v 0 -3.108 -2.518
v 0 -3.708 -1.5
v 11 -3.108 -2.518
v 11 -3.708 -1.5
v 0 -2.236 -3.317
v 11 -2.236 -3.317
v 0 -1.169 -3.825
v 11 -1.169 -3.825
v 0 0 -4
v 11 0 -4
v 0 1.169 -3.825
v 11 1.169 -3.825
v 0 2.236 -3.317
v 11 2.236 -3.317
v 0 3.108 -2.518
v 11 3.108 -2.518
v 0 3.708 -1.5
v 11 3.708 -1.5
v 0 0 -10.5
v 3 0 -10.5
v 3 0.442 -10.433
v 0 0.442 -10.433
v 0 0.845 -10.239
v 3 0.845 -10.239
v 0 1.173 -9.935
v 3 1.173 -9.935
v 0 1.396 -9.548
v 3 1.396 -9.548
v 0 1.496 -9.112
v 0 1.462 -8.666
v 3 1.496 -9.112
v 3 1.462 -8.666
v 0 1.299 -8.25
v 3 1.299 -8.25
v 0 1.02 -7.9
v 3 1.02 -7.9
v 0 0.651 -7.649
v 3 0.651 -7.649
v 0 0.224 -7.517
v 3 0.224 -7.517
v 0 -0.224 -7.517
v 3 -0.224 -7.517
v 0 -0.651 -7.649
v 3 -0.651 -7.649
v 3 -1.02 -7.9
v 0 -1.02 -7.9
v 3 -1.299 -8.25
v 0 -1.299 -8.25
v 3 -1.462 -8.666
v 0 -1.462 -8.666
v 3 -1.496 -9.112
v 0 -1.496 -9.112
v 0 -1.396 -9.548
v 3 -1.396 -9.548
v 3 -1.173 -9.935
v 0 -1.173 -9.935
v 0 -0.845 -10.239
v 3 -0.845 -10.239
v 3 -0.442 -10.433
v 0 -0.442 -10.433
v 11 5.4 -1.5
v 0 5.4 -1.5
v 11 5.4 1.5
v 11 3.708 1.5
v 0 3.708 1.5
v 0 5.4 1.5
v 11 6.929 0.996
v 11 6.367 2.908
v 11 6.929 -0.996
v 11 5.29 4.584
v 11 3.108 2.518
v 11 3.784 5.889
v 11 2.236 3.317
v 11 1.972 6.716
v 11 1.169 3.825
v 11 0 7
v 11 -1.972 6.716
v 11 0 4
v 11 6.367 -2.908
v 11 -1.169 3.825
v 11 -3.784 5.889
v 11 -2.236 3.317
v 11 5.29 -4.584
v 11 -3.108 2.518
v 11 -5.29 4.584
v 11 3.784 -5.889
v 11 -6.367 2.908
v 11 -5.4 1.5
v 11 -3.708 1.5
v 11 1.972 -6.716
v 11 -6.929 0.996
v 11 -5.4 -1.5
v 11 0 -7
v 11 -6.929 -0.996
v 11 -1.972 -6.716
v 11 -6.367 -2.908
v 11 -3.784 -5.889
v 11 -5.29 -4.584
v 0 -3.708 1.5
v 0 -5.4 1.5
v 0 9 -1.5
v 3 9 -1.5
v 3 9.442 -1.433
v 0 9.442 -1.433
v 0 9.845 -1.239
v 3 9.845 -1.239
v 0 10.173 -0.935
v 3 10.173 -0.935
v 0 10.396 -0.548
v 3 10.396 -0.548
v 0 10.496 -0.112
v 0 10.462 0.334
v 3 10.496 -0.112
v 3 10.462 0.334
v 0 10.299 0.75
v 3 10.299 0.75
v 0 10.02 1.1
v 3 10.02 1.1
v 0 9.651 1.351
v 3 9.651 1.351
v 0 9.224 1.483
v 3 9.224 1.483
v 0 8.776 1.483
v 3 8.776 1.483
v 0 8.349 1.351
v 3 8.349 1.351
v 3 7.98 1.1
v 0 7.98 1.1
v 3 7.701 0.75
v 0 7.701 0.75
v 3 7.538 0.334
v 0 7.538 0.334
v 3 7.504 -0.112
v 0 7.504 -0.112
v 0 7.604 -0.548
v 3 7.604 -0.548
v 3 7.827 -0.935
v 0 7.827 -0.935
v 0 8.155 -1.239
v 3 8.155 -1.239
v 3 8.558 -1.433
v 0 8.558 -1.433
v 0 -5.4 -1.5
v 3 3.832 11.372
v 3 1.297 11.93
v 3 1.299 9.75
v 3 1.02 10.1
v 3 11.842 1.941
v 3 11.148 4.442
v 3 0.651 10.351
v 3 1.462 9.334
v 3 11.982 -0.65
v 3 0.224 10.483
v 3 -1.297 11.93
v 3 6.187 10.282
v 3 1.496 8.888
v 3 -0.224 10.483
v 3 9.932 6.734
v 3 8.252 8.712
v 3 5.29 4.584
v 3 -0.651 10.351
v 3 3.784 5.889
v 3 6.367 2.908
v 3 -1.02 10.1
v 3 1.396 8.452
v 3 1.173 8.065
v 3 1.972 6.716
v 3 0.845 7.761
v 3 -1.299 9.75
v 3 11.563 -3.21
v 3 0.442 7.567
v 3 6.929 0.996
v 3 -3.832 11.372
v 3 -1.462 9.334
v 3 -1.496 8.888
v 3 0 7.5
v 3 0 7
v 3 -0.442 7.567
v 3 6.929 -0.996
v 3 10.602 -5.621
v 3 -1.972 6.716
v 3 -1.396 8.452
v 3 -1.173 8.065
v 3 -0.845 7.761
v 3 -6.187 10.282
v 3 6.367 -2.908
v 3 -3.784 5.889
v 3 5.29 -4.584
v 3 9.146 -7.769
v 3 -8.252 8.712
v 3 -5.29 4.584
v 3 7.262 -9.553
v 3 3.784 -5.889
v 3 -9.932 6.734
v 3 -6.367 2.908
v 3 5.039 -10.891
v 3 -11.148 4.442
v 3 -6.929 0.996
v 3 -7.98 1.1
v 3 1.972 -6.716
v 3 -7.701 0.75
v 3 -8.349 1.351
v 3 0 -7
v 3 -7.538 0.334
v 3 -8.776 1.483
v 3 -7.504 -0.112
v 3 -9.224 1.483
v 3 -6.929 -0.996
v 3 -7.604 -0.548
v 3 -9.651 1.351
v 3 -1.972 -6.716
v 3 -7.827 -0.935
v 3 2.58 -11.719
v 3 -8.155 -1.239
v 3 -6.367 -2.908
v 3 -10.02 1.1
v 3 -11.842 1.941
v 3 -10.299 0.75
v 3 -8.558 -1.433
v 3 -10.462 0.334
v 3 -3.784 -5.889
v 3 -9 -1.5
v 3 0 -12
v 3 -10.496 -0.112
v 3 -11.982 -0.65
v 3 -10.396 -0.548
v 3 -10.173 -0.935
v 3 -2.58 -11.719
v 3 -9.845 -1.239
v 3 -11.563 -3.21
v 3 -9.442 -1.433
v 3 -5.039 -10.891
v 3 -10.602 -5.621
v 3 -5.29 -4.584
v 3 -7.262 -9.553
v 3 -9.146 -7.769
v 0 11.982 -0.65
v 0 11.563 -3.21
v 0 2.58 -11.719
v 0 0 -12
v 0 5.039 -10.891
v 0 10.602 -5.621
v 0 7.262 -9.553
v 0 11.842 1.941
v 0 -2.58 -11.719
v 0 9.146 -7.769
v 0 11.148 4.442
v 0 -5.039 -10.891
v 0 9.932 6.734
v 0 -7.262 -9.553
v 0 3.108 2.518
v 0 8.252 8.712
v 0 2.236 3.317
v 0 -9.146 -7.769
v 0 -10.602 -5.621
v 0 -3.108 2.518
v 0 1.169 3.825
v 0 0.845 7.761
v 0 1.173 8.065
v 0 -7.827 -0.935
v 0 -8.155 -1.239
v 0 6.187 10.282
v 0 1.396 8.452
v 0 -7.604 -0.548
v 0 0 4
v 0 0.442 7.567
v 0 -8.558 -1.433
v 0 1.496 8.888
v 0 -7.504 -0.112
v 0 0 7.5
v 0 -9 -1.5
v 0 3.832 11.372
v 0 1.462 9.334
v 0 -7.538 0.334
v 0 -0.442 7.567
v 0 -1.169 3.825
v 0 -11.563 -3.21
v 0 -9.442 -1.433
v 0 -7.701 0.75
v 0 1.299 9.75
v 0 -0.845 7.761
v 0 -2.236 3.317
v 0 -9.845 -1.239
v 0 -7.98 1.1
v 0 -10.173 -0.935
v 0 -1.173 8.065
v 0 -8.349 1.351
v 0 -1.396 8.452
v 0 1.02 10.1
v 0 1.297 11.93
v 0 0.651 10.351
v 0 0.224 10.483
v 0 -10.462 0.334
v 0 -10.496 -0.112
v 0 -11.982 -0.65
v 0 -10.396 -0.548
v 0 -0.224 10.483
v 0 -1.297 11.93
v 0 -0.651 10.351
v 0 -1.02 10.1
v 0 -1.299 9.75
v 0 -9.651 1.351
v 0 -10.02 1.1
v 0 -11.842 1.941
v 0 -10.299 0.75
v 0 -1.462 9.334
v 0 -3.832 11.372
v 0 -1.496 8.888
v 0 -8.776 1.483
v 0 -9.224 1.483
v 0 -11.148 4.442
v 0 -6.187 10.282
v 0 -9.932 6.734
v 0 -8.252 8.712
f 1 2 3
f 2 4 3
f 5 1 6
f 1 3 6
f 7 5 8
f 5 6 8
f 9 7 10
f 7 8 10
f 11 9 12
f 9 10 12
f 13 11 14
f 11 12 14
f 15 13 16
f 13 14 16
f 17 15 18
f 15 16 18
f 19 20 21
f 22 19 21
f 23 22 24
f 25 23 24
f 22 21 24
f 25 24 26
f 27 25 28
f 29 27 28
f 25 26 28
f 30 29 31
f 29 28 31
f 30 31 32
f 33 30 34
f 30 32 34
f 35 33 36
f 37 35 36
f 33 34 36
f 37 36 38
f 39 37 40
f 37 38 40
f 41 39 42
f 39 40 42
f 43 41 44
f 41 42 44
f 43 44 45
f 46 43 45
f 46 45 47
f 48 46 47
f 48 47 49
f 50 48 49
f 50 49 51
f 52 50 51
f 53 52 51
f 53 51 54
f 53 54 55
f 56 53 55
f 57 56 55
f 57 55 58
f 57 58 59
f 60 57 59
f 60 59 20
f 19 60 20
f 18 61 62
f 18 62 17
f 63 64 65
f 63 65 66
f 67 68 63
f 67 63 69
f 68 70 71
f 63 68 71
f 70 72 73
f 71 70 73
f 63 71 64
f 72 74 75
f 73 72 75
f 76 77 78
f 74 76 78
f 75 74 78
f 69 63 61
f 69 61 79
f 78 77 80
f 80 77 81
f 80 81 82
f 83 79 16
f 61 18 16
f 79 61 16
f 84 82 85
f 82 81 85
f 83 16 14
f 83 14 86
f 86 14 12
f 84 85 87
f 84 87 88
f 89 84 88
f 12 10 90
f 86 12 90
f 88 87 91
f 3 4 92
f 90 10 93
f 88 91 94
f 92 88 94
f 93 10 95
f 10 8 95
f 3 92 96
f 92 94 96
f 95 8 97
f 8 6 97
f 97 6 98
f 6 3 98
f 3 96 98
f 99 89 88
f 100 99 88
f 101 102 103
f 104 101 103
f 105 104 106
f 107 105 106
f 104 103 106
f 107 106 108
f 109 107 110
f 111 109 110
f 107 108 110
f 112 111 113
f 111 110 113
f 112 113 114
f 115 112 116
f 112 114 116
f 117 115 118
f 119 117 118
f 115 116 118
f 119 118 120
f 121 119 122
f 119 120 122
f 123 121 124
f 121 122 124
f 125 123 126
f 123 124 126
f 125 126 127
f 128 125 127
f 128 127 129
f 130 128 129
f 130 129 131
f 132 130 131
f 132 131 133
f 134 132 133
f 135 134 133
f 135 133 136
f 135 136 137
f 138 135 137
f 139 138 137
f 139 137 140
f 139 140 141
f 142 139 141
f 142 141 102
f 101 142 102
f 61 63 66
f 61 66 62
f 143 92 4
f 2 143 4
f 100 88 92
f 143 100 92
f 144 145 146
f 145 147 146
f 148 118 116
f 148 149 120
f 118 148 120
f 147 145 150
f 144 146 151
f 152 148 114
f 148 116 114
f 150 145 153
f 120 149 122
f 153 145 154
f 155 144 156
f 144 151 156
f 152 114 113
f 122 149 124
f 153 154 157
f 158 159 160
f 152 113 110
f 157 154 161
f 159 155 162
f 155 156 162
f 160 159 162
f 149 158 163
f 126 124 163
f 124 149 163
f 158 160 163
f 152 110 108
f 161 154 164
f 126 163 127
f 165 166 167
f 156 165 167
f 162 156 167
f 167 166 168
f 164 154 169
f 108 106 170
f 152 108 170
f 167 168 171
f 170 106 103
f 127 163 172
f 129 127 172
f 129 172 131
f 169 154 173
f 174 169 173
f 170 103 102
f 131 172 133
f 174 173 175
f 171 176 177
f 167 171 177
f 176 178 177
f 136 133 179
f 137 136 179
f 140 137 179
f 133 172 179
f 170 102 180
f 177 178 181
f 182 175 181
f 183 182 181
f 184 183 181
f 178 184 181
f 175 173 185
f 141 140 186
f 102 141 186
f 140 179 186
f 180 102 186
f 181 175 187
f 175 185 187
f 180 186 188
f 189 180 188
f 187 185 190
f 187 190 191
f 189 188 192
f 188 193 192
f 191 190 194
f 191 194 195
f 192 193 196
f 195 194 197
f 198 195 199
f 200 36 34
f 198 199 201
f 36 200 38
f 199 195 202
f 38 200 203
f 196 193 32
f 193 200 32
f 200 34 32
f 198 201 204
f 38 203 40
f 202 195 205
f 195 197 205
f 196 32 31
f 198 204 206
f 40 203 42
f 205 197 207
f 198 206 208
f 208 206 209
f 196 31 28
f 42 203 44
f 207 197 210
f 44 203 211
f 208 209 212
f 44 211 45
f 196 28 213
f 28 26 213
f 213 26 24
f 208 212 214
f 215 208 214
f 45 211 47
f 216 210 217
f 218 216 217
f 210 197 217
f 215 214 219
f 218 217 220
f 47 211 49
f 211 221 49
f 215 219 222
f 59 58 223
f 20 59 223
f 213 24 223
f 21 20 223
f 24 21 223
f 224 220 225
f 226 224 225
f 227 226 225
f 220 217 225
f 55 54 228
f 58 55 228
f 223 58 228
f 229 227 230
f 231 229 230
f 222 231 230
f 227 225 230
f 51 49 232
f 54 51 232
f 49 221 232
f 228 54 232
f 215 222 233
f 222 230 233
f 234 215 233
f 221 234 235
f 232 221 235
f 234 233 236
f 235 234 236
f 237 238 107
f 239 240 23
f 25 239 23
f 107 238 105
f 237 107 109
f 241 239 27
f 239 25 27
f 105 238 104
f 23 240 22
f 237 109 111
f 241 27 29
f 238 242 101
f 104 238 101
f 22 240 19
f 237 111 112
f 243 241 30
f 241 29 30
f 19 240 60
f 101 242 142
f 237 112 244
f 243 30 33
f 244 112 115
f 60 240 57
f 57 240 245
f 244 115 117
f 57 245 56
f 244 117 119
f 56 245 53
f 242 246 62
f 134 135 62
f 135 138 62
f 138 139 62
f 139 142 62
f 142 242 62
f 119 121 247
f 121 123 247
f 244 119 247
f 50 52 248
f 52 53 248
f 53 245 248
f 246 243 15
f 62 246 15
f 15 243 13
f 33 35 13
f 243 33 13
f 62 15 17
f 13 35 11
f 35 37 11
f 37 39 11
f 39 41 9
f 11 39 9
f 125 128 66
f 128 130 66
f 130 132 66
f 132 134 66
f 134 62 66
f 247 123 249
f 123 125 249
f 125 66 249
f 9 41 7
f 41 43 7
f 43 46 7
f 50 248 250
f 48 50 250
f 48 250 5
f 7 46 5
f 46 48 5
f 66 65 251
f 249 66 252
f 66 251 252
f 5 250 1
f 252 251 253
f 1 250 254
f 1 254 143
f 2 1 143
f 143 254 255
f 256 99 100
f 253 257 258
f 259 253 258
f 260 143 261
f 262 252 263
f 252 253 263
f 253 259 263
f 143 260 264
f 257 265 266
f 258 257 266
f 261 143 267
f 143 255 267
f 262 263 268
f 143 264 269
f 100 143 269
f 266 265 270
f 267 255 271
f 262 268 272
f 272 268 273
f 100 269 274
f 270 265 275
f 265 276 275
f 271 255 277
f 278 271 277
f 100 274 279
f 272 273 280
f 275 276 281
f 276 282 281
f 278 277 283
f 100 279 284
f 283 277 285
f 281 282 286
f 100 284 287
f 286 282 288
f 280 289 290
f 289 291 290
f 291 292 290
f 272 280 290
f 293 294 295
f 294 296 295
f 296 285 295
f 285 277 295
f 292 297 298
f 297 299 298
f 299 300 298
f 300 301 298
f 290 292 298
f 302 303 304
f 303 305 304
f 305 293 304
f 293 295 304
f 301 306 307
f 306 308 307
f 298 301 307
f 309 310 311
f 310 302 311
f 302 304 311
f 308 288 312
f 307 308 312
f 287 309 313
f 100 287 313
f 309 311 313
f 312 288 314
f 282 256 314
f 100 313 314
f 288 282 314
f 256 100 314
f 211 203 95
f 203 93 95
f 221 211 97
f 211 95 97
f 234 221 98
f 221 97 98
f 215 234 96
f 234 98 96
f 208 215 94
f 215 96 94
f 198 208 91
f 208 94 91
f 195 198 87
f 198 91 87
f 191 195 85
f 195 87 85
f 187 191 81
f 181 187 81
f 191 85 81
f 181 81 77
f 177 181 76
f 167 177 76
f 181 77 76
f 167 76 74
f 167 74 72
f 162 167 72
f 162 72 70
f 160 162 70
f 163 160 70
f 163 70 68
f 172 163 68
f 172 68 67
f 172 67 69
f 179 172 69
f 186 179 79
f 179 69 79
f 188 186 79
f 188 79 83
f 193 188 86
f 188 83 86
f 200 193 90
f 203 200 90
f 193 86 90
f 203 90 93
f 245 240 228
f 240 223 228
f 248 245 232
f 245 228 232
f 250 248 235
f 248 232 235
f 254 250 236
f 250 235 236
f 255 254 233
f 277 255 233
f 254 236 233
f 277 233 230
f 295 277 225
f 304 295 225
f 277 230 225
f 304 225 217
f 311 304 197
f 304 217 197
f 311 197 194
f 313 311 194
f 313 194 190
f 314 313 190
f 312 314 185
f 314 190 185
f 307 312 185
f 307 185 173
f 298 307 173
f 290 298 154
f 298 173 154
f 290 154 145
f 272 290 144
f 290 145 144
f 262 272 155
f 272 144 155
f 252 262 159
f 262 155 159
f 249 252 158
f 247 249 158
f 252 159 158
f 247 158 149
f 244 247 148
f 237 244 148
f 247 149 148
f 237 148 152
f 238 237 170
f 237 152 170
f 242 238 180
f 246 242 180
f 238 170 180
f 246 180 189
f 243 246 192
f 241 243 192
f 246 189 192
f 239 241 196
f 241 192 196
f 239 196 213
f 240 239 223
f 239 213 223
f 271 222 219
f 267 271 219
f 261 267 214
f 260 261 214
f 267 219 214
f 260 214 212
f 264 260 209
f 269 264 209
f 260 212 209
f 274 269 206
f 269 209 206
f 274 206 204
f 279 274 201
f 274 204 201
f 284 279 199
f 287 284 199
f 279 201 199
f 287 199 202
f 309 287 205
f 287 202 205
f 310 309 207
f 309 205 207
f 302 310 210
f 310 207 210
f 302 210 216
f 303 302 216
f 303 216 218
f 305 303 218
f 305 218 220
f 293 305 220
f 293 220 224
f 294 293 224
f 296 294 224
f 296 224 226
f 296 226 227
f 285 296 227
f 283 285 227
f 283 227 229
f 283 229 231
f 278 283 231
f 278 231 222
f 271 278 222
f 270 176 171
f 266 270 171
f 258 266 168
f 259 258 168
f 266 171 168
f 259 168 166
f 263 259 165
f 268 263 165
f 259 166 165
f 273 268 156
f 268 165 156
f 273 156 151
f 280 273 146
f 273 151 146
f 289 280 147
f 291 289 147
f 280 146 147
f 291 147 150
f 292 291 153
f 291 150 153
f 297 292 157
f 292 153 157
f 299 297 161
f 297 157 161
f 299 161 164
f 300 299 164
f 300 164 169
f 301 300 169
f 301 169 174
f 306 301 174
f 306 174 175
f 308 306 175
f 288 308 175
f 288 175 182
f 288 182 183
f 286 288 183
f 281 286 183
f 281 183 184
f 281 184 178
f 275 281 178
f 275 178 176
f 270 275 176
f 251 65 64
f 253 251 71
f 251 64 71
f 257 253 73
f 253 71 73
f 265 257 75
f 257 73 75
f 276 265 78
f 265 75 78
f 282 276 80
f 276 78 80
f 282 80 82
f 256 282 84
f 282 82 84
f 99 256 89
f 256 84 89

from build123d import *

# Parameters (mm, degrees)
CUT_EXTRUDE_1_DEPTH = 21.223748416
CUT_EXTRUDE_2_REACH = 20.762
SKETCH_3_R          = 1.5
SKETCH_5_R          = 1.7
CUT_EXTRUDE_3_DEPTH = 21.223748416
SKETCH_6_R          = 4
CUT_EXTRUDE_4_DEPTH = 19.761663039


with BuildPart() as part:
    # 草图1 → 旋转1 (revolve)
    with BuildSketch(Plane(origin=(0, 0, 0), x_dir=(1, 0, 0), z_dir=(0, 1, 0))):
        Polygon((0, 0), (0, 12), (3, 12), (3, 7), (11, 7), (11, 4), (3, 4), (3, 0), align=None)
    revolve(axis=Axis((3, 0, 0), (-1, 0, 0)))

    # 草图2 → 切除-拉伸1 (cut, through all)
    with BuildSketch(Plane(origin=(11, 0, 0), x_dir=(0, 0, -1), z_dir=(1, 0, 0))):
        with BuildLine():
            Line((1.5, -5.4), (1.5, -3.708099244))
            ThreePointArc((1.5, -3.708099244), (0, -4), (-1.5, -3.708099244))
            Line((-1.5, -3.708099244), (-1.5, -5.4))
            Line((-1.5, -5.4), (1.5, -5.4))
        make_face()
        with BuildLine():
            Line((-1.5, 5.4), (1.5, 5.4))
            Line((1.5, 5.4), (1.5, 3.708099244))
            ThreePointArc((1.5, 3.708099244), (0, 4), (-1.5, 3.708099244))
            Line((-1.5, 3.708099244), (-1.5, 5.4))
        make_face()
    extrude(amount=-CUT_EXTRUDE_1_DEPTH, mode=Mode.SUBTRACT)

    # 草图3 → 切除-拉伸2 (cut, up to next)
    with BuildSketch(Plane(origin=(3, 0, 0), x_dir=(0, 0, -1), z_dir=(1, 0, 0)), mode=Mode.PRIVATE) as cut_extrude_2_sk1:
        with Locations((0, 9)):
            Circle(SKETCH_3_R)
    cut_extrude_2_tool1 = extrude(cut_extrude_2_sk1.sketch, amount=-CUT_EXTRUDE_2_REACH, mode=Mode.PRIVATE) & part.part
    # 草图3 → 切除-拉伸2 (cut, up to next)
    with BuildSketch(Plane(origin=(3, 0, 0), x_dir=(0, 0, -1), z_dir=(1, 0, 0)), mode=Mode.PRIVATE) as cut_extrude_2_sk2:
        with Locations((9, 0)):
            Circle(SKETCH_3_R)
    cut_extrude_2_tool2 = extrude(cut_extrude_2_sk2.sketch, amount=-CUT_EXTRUDE_2_REACH, mode=Mode.PRIVATE) & part.part
    # 草图3 → 切除-拉伸2 (cut, up to next)
    with BuildSketch(Plane(origin=(3, 0, 0), x_dir=(0, 0, -1), z_dir=(1, 0, 0)), mode=Mode.PRIVATE) as cut_extrude_2_sk3:
        with Locations((0, -9)):
            Circle(SKETCH_3_R)
    cut_extrude_2_tool3 = extrude(cut_extrude_2_sk3.sketch, amount=-CUT_EXTRUDE_2_REACH, mode=Mode.PRIVATE) & part.part
    # 草图3 → 切除-拉伸2 (cut, up to next)
    with BuildSketch(Plane(origin=(3, 0, 0), x_dir=(0, 0, -1), z_dir=(1, 0, 0)), mode=Mode.PRIVATE) as cut_extrude_2_sk4:
        with Locations((-9, 0)):
            Circle(SKETCH_3_R)
    cut_extrude_2_tool4 = extrude(cut_extrude_2_sk4.sketch, amount=-CUT_EXTRUDE_2_REACH, mode=Mode.PRIVATE) & part.part
    add(cut_extrude_2_tool1.solids().sort_by_distance((3, 9, 0))[0], mode=Mode.SUBTRACT)
    add(cut_extrude_2_tool2.solids().sort_by_distance((3, 0, -9))[0], mode=Mode.SUBTRACT)
    add(cut_extrude_2_tool3.solids().sort_by_distance((3, -9, 0))[0], mode=Mode.SUBTRACT)
    add(cut_extrude_2_tool4.solids().sort_by_distance((3, 0, 9))[0], mode=Mode.SUBTRACT)

    # 草图5 → 切除-拉伸3 (cut, through all)
    with BuildSketch(Plane.ZY):
        Circle(SKETCH_5_R)
    extrude(amount=-CUT_EXTRUDE_3_DEPTH, mode=Mode.SUBTRACT)

    # 草图6 → 切除-拉伸4 (cut, through all)
    with BuildSketch(Plane(origin=(3, 0, 0), x_dir=(0, 0, -1), z_dir=(1, 0, 0))):
        Circle(SKETCH_6_R)
    extrude(amount=-CUT_EXTRUDE_4_DEPTH, mode=Mode.SUBTRACT)


solid = part.part
